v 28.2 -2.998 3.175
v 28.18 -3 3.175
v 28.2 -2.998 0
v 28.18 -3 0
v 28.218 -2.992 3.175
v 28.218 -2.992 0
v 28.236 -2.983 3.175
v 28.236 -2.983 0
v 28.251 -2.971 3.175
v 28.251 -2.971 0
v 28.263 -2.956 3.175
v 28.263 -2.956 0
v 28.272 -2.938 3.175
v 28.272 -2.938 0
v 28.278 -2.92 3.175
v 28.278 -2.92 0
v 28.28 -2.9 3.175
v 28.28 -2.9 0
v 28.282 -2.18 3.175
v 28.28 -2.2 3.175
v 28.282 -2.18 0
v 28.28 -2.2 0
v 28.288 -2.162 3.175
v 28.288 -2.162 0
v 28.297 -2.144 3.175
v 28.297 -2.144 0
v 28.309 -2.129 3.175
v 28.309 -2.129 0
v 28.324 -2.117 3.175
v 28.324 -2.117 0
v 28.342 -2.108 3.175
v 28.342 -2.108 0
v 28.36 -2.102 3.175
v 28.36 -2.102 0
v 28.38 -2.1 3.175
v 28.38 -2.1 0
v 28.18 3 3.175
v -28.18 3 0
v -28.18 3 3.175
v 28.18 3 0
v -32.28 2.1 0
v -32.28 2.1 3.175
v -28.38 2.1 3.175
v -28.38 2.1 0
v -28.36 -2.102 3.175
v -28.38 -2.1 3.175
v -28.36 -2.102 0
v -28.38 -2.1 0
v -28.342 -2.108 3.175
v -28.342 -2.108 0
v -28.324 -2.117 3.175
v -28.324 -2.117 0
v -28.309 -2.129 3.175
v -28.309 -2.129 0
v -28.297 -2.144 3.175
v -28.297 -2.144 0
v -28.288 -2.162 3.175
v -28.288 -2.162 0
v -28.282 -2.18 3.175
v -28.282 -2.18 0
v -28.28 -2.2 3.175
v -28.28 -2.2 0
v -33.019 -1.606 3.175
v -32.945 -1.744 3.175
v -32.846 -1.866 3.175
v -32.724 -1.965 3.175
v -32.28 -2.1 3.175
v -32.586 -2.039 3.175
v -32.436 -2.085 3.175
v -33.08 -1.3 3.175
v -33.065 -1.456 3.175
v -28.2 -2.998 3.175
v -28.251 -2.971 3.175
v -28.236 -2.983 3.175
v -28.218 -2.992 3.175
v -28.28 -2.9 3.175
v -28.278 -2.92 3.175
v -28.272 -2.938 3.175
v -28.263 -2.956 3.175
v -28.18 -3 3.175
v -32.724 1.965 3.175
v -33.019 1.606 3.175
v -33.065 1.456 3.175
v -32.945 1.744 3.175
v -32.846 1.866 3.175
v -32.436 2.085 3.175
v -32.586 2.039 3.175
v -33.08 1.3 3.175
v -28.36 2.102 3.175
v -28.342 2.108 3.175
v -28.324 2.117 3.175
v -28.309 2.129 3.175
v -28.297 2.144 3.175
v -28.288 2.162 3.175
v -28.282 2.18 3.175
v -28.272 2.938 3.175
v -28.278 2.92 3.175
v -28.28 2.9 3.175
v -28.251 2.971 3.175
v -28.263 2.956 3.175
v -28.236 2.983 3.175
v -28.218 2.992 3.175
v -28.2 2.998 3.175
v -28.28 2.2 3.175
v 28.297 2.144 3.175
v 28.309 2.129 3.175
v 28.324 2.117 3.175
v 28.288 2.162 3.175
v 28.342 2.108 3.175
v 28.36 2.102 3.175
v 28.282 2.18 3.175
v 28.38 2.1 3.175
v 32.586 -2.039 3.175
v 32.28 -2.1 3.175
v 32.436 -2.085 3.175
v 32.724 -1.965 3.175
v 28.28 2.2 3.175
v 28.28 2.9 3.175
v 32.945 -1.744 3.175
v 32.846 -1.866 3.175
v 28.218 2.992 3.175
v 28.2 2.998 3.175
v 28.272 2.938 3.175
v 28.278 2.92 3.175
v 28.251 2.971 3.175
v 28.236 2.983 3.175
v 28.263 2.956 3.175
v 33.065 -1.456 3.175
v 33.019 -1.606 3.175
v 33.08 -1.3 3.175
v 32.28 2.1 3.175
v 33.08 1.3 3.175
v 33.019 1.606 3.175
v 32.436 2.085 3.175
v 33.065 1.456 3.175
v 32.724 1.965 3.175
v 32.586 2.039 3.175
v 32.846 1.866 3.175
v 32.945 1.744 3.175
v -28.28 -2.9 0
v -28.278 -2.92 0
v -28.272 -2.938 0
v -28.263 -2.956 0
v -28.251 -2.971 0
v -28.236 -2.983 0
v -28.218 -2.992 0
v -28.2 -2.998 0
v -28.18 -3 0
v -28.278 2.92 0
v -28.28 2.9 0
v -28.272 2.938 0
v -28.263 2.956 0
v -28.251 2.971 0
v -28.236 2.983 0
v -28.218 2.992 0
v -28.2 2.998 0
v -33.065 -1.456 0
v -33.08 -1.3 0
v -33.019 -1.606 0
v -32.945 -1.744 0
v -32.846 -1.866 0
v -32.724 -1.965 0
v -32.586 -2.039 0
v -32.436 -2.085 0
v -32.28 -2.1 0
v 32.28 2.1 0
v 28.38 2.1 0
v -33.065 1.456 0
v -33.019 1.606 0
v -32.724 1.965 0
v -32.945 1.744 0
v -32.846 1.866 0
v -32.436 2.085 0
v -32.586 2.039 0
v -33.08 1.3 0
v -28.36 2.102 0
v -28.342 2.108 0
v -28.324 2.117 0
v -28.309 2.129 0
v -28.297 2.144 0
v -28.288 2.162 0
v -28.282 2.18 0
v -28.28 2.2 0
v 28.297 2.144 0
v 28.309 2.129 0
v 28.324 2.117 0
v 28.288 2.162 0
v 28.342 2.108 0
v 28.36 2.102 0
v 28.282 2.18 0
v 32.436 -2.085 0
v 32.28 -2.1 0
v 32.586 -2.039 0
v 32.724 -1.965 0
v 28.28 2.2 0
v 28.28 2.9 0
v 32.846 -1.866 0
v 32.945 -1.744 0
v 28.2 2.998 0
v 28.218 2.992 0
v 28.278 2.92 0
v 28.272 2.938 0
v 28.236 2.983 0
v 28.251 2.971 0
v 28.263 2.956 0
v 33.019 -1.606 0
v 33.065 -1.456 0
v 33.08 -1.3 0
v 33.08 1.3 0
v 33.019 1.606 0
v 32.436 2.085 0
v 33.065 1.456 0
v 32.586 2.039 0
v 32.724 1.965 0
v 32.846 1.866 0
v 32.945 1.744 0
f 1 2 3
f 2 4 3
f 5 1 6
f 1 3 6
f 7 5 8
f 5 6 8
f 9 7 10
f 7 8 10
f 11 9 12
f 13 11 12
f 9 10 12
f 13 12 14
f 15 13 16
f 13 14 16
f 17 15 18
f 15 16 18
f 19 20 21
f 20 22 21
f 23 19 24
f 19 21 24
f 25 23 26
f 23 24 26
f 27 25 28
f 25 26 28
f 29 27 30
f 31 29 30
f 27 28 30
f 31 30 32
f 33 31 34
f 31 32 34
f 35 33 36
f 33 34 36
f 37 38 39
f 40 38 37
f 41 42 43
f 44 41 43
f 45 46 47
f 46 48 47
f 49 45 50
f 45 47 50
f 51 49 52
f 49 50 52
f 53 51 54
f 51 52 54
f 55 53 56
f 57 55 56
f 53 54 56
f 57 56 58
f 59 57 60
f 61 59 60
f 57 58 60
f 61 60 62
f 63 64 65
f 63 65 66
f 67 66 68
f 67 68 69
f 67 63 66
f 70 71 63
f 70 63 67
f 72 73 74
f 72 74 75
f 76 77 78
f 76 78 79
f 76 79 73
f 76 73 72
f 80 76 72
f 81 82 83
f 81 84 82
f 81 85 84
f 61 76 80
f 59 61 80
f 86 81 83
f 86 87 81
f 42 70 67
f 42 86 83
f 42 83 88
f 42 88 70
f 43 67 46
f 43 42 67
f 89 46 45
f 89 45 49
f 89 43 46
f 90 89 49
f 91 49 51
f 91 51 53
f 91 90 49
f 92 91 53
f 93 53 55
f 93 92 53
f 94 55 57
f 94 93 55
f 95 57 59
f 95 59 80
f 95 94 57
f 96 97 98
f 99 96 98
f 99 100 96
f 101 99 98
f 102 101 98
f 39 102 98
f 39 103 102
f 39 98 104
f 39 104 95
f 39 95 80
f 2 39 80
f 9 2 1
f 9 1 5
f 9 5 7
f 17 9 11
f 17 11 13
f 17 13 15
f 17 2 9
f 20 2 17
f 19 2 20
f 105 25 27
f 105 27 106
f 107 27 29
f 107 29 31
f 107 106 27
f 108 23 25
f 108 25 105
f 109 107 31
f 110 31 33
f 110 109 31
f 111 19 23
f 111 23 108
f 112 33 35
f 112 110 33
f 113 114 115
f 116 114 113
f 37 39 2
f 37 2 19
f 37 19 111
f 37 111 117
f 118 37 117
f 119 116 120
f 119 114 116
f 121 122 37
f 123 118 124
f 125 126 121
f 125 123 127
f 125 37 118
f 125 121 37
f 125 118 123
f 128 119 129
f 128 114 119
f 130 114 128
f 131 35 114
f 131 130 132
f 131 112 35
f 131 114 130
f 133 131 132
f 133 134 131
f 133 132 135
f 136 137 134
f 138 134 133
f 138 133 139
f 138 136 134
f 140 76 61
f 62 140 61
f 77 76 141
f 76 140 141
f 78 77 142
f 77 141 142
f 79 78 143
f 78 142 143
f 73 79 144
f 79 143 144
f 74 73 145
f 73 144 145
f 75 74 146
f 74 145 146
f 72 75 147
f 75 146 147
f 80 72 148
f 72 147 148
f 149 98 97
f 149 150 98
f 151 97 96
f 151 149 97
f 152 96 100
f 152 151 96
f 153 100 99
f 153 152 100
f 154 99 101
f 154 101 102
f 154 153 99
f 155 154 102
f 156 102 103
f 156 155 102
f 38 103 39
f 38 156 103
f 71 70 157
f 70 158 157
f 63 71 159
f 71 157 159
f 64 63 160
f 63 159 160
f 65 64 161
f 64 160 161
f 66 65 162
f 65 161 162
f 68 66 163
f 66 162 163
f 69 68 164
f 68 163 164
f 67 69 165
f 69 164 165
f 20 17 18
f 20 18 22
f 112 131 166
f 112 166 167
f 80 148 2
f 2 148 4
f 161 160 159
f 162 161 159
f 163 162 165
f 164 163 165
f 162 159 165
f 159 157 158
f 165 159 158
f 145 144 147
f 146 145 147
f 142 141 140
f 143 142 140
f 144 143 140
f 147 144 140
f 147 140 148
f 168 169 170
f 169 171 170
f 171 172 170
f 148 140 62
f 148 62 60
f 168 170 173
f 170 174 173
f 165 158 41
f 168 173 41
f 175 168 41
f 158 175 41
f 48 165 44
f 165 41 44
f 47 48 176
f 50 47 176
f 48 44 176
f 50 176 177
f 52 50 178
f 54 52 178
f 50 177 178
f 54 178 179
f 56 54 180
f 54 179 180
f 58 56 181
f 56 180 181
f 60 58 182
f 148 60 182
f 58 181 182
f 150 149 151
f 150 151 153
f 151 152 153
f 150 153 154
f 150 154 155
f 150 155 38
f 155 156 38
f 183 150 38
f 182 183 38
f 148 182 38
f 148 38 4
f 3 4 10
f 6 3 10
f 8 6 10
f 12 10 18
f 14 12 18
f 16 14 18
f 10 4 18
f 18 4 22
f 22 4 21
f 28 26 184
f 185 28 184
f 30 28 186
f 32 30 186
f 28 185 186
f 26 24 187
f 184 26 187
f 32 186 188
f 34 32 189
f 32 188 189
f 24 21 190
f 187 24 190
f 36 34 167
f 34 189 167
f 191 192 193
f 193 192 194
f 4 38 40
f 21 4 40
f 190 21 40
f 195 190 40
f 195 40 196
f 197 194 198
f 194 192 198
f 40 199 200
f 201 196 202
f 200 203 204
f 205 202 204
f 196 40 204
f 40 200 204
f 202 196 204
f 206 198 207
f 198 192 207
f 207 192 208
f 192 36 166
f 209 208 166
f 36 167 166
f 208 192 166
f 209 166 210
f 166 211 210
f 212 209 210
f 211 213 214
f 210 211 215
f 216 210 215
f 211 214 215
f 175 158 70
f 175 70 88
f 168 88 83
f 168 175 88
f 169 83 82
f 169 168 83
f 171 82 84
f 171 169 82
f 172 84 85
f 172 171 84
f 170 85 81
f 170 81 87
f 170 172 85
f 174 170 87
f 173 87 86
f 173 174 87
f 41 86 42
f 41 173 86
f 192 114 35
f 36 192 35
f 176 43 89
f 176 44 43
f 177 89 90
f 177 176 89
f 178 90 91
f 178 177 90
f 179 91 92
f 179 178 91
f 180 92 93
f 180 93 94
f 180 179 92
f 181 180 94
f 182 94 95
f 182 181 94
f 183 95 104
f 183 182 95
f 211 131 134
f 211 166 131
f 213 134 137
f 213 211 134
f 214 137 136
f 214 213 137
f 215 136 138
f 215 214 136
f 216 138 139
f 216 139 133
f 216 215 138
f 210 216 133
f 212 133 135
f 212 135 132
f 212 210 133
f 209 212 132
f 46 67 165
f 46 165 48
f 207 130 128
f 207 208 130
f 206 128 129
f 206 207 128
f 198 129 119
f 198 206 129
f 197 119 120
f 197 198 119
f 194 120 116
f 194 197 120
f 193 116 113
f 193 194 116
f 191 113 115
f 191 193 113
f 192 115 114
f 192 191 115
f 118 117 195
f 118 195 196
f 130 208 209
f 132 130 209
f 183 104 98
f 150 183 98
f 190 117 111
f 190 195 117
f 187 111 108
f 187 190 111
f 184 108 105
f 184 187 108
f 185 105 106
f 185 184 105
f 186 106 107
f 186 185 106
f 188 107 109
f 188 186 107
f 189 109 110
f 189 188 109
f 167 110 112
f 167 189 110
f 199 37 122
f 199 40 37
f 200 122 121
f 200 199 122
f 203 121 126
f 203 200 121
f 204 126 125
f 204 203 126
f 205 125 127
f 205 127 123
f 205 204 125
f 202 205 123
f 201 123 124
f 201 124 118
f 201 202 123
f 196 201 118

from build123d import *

# Parameters (mm, degrees)
SKETCH1_W           = 66.16
SKETCH1_H           = 6
BOSS_EXTRUDE1_DEPTH = 3.175
SKETCH3_W           = 4.8
SKETCH3_H           = 0.9
CUT_EXTRUDE1_DEPTH  = 34.367154883
FILLET1_R           = 0.8
FILLET2_R           = 0.1


with BuildPart() as part:
    # Sketch1 → Boss-Extrude1 (new body)
    with BuildSketch(Plane.XY):
        Rectangle(SKETCH1_W, SKETCH1_H)
    extrude(amount=BOSS_EXTRUDE1_DEPTH)

    # Sketch3 → Cut-Extrude1 (cut, through all)
    with BuildSketch(Plane.XY.offset(3.175)):
        with Locations((-30.68, 2.55)):
            Rectangle(SKETCH3_W, SKETCH3_H)
        with Locations((-30.68, -2.55)):
            Rectangle(SKETCH3_W, SKETCH3_H)
    cut_extrude1 = extrude(amount=-CUT_EXTRUDE1_DEPTH, mode=Mode.SUBTRACT)

    # Mirror1: Cut-Extrude1 across plane
    add(cut_extrude1.mirror(Plane(origin=(0, 0, 0), x_dir=(0, 0, 1), z_dir=(1, 0, 0))), mode=Mode.SUBTRACT)

    # Fillet1
    fillet1_edges = [part.edges().sort_by_distance(p)[0] for p in [
        (-33.08, 2.1, 1.5875),
        (-33.08, -2.1, 1.5875),
        (33.08, 2.1, 1.5875),
        (33.08, -2.1, 1.5875),
    ]]
    fillet(fillet1_edges, radius=FILLET1_R)

    # Fillet2
    fillet2_edges = [part.edges().sort_by_distance(p)[0] for p in [
        (-28.28, 3, 1.5875),
        (-28.28, 2.1, 1.5875),
        (-28.28, -2.1, 1.5875),
        (-28.28, -3, 1.5875),
        (28.28, 2.1, 1.5875),
        (28.28, 3, 1.5875),
        (28.28, -3, 1.5875),
        (28.28, -2.1, 1.5875),
    ]]
    fillet(fillet2_edges, radius=FILLET2_R)


solid = part.part
